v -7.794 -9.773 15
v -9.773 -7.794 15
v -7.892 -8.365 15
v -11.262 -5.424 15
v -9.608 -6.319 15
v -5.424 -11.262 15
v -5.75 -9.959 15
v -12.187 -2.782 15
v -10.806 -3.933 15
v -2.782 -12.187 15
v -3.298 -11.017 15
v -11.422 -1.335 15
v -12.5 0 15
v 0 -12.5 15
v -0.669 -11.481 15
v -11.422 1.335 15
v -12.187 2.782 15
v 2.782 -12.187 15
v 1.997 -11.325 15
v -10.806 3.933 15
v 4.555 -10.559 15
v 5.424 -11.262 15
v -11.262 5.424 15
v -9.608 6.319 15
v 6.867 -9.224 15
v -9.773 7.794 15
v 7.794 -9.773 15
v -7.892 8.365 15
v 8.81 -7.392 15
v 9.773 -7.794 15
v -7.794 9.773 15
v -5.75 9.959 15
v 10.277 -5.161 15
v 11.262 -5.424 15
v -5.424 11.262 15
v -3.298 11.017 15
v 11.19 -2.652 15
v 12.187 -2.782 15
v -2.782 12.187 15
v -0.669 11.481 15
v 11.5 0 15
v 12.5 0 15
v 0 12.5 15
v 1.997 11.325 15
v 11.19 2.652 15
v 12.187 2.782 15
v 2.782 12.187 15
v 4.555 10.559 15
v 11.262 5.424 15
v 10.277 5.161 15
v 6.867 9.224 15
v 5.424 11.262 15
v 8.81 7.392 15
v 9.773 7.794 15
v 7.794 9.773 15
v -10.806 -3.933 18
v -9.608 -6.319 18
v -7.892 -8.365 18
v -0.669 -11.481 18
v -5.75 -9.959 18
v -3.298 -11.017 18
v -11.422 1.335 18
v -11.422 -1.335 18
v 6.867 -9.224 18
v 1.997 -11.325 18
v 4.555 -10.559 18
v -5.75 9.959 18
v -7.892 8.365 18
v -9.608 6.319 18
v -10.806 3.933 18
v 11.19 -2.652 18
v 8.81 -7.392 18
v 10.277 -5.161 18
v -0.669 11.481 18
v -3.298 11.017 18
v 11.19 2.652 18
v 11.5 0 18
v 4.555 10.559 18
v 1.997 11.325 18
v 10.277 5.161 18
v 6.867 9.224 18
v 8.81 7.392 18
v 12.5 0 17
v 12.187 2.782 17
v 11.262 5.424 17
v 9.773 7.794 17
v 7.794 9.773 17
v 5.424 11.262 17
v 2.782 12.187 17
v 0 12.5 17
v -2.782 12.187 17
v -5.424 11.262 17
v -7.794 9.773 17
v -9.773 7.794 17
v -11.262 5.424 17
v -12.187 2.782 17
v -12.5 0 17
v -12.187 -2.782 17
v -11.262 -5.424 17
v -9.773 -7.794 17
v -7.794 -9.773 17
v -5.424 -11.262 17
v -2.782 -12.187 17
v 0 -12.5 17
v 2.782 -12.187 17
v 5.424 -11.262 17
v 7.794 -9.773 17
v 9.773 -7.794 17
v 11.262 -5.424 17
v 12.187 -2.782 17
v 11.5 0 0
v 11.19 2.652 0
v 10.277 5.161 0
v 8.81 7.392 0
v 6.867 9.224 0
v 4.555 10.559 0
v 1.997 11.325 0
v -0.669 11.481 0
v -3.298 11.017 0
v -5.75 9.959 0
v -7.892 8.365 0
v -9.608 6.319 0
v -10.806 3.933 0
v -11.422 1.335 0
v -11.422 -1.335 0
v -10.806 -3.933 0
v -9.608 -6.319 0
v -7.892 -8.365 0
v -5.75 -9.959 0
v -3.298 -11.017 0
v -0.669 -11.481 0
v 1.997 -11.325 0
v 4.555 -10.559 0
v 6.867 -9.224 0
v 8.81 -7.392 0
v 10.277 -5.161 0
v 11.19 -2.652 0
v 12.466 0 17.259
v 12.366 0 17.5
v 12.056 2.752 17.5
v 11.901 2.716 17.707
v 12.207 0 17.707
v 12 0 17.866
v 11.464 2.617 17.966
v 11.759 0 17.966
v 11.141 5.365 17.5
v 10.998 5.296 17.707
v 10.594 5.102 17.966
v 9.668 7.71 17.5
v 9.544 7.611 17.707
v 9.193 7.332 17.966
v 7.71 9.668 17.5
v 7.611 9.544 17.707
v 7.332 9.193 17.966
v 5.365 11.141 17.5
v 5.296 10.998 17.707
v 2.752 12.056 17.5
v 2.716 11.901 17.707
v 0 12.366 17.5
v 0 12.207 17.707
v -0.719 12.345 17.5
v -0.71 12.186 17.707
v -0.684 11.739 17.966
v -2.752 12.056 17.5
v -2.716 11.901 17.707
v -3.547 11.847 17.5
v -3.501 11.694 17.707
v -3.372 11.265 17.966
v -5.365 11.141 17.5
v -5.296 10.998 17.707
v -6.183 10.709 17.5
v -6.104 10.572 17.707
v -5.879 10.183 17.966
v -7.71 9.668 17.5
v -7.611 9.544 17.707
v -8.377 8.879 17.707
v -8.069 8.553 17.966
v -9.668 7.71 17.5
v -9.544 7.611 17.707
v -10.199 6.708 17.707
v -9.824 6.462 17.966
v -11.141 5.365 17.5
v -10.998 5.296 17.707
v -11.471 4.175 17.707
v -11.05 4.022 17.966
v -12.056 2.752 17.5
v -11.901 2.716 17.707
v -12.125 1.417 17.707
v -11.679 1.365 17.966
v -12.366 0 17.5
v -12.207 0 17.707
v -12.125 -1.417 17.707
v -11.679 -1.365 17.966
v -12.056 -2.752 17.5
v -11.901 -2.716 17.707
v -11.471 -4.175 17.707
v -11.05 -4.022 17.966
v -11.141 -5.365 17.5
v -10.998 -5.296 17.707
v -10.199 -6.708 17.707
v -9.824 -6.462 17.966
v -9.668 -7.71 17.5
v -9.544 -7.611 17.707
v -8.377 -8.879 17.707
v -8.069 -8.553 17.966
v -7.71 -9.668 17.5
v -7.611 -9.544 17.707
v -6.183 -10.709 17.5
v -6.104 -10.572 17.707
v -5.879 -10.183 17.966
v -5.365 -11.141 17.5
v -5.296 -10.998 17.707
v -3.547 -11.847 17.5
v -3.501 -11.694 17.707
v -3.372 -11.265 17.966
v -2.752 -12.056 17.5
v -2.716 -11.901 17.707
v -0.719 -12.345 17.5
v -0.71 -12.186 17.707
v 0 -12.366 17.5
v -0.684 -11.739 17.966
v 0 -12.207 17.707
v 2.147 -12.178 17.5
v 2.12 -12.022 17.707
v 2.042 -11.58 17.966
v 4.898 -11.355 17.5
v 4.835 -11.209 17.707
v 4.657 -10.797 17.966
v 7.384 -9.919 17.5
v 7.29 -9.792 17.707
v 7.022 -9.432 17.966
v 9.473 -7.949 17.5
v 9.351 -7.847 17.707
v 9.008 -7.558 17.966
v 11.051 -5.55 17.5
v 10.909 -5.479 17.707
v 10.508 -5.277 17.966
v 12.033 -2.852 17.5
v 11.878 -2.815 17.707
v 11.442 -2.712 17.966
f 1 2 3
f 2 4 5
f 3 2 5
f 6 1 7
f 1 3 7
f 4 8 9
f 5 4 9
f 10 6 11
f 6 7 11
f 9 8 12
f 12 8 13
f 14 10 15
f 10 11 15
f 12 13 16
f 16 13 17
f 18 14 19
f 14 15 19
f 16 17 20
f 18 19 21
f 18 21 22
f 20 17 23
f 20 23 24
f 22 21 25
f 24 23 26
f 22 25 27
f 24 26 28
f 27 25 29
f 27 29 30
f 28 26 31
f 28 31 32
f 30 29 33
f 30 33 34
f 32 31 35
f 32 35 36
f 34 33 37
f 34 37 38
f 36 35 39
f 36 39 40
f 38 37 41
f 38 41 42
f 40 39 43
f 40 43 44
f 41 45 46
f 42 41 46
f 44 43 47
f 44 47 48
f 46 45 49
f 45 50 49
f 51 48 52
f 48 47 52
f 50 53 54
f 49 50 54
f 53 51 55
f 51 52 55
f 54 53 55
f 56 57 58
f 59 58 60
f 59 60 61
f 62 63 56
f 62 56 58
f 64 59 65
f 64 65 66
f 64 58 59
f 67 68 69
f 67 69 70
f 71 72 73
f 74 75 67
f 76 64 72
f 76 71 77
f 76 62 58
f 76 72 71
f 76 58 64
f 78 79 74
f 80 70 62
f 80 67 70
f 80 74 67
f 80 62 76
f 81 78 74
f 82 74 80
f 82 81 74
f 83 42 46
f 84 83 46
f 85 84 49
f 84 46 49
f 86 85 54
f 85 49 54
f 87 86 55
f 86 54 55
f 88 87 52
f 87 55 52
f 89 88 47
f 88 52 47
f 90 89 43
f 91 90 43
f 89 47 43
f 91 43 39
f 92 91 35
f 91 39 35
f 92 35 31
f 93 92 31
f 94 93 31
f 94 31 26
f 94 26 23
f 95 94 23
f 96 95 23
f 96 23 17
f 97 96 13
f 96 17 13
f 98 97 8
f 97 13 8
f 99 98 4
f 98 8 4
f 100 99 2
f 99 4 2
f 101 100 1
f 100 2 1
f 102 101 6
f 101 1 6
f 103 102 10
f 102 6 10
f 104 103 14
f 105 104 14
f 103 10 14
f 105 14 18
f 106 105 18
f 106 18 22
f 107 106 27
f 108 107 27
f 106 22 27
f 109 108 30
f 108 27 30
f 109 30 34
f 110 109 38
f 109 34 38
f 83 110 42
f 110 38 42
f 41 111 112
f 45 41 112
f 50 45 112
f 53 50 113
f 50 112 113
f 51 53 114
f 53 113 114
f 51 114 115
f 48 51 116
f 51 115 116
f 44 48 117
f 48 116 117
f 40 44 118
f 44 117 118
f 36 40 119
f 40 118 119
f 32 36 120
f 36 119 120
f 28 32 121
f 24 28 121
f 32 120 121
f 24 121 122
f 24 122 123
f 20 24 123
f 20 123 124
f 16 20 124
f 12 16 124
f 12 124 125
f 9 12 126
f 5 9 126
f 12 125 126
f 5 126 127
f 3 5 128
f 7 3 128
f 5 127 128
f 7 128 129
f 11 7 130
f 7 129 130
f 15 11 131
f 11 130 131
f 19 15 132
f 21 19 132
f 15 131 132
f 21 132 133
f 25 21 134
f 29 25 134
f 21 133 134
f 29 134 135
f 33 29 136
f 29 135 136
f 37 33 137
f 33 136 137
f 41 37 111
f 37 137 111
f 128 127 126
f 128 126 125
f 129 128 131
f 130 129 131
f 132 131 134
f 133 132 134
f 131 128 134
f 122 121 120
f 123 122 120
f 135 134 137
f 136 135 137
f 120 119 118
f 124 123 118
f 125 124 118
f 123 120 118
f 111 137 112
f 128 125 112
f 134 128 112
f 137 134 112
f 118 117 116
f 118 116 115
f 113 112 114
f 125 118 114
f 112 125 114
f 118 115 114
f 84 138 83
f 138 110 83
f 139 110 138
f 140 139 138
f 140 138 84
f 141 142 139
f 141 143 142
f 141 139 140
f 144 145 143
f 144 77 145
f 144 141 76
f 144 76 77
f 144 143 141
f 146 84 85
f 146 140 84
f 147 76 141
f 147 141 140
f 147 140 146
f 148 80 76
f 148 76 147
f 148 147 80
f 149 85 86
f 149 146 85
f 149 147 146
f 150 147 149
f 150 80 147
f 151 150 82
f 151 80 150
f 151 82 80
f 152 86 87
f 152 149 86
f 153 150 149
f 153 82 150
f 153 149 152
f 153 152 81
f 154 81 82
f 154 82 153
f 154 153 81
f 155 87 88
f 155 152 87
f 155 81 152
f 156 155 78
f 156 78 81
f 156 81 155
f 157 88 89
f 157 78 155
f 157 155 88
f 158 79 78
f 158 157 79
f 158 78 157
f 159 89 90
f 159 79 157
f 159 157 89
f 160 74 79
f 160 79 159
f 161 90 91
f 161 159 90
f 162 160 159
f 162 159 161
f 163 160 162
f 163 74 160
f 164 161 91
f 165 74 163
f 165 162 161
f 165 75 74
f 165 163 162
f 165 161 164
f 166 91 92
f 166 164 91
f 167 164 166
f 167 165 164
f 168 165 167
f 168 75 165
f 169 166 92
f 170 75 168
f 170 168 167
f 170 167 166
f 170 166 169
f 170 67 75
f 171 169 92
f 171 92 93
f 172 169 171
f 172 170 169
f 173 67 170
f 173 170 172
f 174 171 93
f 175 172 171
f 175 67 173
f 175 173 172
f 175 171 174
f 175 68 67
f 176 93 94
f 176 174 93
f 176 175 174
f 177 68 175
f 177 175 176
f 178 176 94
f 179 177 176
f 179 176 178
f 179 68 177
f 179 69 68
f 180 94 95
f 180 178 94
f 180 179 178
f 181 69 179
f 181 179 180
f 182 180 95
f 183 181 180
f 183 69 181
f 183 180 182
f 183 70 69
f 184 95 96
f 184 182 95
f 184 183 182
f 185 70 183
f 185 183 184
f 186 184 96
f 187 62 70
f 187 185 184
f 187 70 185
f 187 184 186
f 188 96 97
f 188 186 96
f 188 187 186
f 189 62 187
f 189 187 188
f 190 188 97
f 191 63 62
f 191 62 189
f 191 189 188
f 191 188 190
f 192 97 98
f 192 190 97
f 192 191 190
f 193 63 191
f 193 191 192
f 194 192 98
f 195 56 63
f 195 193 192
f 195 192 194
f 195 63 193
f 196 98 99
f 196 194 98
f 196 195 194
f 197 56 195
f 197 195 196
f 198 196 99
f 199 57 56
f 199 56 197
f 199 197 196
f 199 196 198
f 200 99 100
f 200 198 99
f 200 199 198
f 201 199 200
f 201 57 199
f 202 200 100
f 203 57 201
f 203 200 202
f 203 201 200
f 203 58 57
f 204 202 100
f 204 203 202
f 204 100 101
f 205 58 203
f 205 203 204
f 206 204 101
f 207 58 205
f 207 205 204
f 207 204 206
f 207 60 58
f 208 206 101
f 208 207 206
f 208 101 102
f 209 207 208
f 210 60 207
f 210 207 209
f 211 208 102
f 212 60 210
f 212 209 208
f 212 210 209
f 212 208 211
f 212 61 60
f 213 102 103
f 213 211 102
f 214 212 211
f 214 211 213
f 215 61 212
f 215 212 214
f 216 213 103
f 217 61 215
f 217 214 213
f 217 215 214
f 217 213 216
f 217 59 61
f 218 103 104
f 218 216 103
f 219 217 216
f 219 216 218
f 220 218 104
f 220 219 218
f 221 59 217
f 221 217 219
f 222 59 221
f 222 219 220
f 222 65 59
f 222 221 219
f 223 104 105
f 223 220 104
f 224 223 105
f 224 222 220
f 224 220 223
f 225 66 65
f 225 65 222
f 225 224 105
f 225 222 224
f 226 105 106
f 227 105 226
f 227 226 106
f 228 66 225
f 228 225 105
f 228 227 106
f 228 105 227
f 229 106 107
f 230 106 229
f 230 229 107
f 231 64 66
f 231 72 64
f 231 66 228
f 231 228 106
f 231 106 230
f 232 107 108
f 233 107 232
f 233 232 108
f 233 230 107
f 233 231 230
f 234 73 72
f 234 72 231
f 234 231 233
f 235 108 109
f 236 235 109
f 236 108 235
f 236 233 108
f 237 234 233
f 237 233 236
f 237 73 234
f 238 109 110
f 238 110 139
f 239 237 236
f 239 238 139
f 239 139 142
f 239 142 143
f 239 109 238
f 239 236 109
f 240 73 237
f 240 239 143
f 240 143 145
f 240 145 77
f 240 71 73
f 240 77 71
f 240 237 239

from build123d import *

# Parameters (mm, degrees)
SKETCH_R     = 11.5
PAD_DEPTH    = 15
SKETCH001_R  = 12.5
PAD001_DEPTH = 3
FILLET_R     = 1


with BuildPart() as part:
    # Sketch → Pad (new body)
    with BuildSketch(Plane.XY):
        Circle(SKETCH_R)
    extrude(amount=PAD_DEPTH)

    # Sketch001 (on DatumPlane) → Pad001 (join)
    with BuildSketch(Plane.XY.offset(15)):
        Circle(SKETCH001_R)
    extrude(amount=PAD001_DEPTH)

    # Fillet
    fillet_edges = [part.edges().sort_by_distance(p)[0] for p in [
        (-12.5, 0, 18),
    ]]
    fillet(fillet_edges, radius=FILLET_R)


solid = part.part
